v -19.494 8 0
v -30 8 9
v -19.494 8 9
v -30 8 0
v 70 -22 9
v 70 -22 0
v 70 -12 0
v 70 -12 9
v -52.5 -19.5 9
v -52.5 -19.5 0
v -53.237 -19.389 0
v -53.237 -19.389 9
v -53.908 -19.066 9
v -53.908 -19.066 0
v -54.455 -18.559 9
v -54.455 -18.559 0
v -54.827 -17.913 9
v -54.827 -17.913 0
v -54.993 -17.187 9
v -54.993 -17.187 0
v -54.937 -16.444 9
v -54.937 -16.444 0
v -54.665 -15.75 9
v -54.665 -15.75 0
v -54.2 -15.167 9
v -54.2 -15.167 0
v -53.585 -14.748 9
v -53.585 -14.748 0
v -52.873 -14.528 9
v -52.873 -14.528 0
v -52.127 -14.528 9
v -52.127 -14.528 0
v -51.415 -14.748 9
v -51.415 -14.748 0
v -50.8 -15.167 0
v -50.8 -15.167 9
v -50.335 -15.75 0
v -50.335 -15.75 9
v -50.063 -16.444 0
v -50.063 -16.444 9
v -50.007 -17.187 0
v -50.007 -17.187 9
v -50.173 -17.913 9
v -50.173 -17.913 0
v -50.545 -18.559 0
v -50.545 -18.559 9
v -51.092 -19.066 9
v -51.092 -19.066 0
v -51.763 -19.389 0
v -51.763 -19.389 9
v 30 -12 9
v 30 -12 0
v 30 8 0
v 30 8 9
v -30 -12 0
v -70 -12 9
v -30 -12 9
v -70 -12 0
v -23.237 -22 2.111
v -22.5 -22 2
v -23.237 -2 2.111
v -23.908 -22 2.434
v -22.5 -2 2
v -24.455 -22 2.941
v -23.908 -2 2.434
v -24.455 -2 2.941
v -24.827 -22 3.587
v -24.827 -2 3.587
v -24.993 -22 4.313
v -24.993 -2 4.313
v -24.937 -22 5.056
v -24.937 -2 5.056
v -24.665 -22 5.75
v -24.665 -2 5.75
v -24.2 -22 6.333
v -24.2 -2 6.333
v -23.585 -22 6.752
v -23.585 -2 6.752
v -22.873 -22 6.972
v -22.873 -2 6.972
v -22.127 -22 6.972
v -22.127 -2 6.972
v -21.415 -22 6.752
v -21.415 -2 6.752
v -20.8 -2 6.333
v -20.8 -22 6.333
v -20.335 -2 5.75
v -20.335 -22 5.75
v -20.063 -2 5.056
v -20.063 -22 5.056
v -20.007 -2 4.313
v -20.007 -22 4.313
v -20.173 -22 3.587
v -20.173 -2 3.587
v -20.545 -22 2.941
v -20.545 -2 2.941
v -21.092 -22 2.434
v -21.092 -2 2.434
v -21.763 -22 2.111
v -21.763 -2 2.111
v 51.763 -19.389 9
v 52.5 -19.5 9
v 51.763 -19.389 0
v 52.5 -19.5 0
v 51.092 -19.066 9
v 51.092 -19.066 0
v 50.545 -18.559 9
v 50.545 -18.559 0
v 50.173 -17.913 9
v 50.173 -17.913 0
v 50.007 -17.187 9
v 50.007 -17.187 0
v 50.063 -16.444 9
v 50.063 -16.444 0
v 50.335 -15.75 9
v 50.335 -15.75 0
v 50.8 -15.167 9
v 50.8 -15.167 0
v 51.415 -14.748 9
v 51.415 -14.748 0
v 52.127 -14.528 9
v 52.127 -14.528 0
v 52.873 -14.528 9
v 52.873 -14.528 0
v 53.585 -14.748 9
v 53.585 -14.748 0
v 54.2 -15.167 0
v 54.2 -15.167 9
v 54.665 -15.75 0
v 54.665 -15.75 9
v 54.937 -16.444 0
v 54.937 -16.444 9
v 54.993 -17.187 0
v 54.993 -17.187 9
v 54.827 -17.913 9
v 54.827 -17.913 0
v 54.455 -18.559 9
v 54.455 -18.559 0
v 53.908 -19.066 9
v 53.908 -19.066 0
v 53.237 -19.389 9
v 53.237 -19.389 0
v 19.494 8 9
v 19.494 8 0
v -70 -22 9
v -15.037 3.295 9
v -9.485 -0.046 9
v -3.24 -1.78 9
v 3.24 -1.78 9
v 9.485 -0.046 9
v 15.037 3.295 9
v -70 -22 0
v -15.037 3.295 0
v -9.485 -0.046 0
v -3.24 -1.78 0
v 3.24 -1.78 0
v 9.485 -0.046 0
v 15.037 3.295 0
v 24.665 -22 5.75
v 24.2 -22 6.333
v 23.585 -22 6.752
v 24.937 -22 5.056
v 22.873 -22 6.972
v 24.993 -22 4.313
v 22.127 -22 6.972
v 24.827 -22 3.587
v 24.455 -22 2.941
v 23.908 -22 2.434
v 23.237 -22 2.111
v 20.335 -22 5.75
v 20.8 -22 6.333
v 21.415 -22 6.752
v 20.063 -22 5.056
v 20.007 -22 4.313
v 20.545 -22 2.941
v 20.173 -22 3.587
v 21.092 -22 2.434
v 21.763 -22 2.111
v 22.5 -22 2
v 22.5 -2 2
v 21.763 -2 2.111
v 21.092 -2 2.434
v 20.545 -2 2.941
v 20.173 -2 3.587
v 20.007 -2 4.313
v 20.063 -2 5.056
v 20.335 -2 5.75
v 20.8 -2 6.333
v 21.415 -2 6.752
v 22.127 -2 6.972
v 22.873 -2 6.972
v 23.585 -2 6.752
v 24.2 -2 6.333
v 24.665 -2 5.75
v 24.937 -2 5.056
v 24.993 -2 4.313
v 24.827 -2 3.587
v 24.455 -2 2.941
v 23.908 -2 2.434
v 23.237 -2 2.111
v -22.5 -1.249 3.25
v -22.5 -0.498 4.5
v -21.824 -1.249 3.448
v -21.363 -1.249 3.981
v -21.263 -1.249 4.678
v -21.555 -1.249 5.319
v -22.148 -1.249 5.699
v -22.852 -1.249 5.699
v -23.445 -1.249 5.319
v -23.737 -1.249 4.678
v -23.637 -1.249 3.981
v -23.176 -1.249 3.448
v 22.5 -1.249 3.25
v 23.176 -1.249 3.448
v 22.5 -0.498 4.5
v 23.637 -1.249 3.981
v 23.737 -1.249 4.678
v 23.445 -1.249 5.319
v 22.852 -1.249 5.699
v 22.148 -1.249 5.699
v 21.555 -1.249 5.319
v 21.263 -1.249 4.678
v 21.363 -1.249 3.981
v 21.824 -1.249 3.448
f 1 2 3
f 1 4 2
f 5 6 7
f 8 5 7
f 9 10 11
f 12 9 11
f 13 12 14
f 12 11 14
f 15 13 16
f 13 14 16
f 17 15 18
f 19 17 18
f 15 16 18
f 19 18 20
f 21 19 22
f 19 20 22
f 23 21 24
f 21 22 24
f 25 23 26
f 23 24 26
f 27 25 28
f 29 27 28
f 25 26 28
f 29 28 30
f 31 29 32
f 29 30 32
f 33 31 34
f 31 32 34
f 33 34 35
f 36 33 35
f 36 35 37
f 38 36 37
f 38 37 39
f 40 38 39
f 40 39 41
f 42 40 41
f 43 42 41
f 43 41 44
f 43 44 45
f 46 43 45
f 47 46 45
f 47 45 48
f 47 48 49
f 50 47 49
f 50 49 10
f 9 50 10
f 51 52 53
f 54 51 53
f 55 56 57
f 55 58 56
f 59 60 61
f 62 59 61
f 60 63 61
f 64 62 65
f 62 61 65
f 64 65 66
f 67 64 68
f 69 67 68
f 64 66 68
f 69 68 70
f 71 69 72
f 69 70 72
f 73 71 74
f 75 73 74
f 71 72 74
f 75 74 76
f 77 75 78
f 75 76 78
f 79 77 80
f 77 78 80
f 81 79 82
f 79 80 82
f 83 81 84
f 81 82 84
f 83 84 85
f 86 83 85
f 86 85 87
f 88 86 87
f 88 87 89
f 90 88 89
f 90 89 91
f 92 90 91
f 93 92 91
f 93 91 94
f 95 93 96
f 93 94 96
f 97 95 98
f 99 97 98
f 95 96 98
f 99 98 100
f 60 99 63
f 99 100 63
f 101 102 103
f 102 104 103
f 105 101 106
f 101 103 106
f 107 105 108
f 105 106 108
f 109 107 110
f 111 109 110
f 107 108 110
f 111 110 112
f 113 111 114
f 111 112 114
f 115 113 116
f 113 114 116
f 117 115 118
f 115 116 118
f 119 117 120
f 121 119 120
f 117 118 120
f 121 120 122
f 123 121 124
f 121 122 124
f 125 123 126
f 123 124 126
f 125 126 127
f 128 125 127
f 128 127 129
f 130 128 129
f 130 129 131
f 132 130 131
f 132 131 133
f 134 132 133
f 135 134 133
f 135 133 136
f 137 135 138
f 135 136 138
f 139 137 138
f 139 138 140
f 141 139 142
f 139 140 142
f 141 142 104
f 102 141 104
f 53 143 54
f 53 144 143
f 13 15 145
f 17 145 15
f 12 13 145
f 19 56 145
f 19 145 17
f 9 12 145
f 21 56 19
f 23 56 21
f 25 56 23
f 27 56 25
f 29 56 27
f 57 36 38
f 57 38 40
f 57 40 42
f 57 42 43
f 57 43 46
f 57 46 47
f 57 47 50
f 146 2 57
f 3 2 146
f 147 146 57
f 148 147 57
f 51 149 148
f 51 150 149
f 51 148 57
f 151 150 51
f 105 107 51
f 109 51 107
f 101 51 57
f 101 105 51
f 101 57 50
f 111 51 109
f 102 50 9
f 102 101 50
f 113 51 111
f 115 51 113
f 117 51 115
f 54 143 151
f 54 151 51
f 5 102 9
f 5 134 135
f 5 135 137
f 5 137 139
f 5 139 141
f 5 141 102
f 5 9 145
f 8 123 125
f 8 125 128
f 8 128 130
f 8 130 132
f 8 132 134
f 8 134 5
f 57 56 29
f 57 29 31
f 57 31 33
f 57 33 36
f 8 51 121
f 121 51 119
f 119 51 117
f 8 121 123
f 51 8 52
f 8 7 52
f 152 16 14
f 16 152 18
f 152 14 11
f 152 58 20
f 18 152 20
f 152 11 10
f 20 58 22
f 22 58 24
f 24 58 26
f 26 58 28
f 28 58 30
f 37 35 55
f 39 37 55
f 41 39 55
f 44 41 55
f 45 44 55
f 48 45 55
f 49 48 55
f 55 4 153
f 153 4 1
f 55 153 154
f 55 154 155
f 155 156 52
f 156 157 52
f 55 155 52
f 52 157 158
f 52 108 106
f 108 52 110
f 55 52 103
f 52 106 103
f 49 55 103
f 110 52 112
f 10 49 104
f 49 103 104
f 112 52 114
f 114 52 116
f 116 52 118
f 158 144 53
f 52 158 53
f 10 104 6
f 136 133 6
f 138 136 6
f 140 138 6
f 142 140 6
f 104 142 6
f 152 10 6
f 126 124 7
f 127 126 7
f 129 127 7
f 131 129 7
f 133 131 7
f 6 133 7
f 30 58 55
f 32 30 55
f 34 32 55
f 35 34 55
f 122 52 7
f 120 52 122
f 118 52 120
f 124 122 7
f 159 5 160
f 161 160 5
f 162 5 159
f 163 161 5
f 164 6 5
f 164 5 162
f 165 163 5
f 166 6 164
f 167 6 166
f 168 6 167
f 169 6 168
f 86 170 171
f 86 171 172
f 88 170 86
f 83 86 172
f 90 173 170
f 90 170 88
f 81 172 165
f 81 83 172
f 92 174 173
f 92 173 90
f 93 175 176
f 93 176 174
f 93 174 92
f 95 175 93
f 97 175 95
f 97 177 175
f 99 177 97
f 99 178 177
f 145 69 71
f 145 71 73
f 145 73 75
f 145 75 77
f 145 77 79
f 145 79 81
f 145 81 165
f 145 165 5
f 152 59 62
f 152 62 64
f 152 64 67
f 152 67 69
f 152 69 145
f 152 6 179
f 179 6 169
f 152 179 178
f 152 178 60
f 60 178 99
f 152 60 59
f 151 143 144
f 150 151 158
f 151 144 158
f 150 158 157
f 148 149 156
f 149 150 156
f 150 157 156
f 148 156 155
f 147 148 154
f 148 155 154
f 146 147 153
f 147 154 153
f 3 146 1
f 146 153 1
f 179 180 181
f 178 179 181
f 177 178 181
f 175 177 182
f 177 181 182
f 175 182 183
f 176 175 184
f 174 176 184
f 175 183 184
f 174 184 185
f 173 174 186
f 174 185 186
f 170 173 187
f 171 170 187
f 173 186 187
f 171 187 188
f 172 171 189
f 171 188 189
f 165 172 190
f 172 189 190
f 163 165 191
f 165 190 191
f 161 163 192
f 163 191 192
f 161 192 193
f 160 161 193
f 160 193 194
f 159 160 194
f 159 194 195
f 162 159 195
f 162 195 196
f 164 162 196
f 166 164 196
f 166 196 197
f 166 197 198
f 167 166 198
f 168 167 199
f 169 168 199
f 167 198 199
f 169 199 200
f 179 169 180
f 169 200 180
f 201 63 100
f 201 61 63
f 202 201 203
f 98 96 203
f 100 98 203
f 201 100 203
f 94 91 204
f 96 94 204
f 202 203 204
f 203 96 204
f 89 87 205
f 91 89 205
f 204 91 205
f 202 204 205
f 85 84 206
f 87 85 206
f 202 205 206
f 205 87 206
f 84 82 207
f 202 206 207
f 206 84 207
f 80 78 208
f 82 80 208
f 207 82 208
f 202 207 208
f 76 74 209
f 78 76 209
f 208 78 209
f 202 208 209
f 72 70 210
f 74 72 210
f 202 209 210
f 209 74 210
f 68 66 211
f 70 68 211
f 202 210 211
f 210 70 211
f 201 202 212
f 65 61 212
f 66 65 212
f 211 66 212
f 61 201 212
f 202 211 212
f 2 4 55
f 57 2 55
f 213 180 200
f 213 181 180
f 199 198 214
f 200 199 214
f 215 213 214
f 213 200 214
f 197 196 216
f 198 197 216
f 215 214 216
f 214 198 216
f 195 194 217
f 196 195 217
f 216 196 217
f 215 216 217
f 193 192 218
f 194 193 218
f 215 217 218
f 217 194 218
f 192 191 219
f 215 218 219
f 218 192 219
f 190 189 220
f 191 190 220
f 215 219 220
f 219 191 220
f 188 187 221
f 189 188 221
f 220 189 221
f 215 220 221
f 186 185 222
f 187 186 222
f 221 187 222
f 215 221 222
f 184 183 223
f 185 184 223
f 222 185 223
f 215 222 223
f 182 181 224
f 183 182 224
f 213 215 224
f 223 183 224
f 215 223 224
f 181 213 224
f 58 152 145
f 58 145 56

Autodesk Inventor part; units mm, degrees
ref_plane "YZ Plane" through (0, 0, 0) normal (1, 0, 0) x (0, 1, 0)
ref_plane "XZ Plane" through (0, 0, 0) normal (0, 1, 0) x (-1, 0, 0)
ref_plane "XY Plane" through (0, 0, 0) normal (0, 0, 1) x (1, 0, 0)
sketch "Boceto3" plane through (0, 0, 0) normal (0, 0, 1) x (1, 0, 0)
  line L0 (-30, 8) -> (-30, -12)
  line L1 (-30, -22) -> (30, -22)
  line L2 (30, -12) -> (30, 8)
  arc A0 (-19.4936, 8) -> (19.4936, 8) centre (0, 22) ccw
  line L3 (-30, 8) -> (-19.4936, 8)
  line L4 (19.4936, 8) -> (30, 8)
  line L5 (-30, -22) -> (-70, -22)
  line L6 (-70, -22) -> (-70, -12)
  line L7 (-70, -12) -> (-30, -12)
  line L8 (30, -22) -> (70, -22)
  line L9 (70, -22) -> (70, -12)
  line L10 (70, -12) -> (30, -12)
  point P0 (0, 0)
  point P1 (0, -22)
  point P2 (30, 0)
  dimension "d16" = 60
  dimension "d38" = 24
  dimension "d39" = 10.5064
  dimension "d40" = 10.5064
  dimension "d41" = 30
  dimension "d42" = 30
  dimension "d43" = 22
  dimension "d44" = 40
  dimension "d45" = 10
  dimension "d46" = 40
  dimension "d47" = 10
extrude "Extrusión2" add sketch "Boceto3" along normal blind 9
sketch "Boceto5" plane through (0, 0, 9) normal (0, 0, 1) x (1, 0, 0)
  line L0 (-70, -22) -> (70, -22) projected
  line L1 (70, -22) -> (70, -12) projected
  line L2 (70, -12) -> (30, -12) projected
  line L3 (30, -12) -> (30, 8) projected
  line L4 (30, 8) -> (19.4936, 8) projected
  arc A0 (-19.4936, 8) -> (19.4936, 8) centre (0, 22) ccw projected
  line L5 (-19.4936, 8) -> (-30, 8) projected
  line L6 (-30, 8) -> (-30, -12) projected
  line L7 (-30, -12) -> (-70, -12) projected
  line L8 (-70, -12) -> (-70, -22) projected
  point P0 (0, 0)
  point P1 (-52.5, -17)
  point P2 (52.5, -17)
  dimension "d55" = 5
  dimension "d56" = 17.5
  dimension "d57" = 5
  dimension "d58" = 17.5
hole "Agujero2" at (-52.5, -17, 9) at (52.5, -17, 9) direction (0, 0, -1) diameter 5 depth 10 tip angle 118
sketch "Boceto6" plane through (-70, -22, 0) normal (0, -1, 0) x (1, 0, 0)
  line L0 (0, 0) -> (140, 0) projected
  line L1 (140, 0) -> (140, 9) projected
  line L2 (0, 9) -> (140, 9) projected
  line L3 (0, 0) -> (0, 9) projected
  line L4 (40, 0) -> (40, 9) projected
  line L5 (100, 0) -> (100, 9) projected
  point P0 (70, 0)
  point P1 (47.5, 4.5)
  point P2 (92.5, 4.5)
  dimension "d67" = 47.5
  dimension "d68" = 47.5
  dimension "d69" = 4.5
  dimension "d70" = 4.5
hole "Agujero3" at (-22.5, -22, 4.5) at (22.5, -22, 4.5) direction (0, 1, 0) diameter 5 depth 20 tip angle 118
properties part number "Soporte para Motor 2" material "Abedul"
